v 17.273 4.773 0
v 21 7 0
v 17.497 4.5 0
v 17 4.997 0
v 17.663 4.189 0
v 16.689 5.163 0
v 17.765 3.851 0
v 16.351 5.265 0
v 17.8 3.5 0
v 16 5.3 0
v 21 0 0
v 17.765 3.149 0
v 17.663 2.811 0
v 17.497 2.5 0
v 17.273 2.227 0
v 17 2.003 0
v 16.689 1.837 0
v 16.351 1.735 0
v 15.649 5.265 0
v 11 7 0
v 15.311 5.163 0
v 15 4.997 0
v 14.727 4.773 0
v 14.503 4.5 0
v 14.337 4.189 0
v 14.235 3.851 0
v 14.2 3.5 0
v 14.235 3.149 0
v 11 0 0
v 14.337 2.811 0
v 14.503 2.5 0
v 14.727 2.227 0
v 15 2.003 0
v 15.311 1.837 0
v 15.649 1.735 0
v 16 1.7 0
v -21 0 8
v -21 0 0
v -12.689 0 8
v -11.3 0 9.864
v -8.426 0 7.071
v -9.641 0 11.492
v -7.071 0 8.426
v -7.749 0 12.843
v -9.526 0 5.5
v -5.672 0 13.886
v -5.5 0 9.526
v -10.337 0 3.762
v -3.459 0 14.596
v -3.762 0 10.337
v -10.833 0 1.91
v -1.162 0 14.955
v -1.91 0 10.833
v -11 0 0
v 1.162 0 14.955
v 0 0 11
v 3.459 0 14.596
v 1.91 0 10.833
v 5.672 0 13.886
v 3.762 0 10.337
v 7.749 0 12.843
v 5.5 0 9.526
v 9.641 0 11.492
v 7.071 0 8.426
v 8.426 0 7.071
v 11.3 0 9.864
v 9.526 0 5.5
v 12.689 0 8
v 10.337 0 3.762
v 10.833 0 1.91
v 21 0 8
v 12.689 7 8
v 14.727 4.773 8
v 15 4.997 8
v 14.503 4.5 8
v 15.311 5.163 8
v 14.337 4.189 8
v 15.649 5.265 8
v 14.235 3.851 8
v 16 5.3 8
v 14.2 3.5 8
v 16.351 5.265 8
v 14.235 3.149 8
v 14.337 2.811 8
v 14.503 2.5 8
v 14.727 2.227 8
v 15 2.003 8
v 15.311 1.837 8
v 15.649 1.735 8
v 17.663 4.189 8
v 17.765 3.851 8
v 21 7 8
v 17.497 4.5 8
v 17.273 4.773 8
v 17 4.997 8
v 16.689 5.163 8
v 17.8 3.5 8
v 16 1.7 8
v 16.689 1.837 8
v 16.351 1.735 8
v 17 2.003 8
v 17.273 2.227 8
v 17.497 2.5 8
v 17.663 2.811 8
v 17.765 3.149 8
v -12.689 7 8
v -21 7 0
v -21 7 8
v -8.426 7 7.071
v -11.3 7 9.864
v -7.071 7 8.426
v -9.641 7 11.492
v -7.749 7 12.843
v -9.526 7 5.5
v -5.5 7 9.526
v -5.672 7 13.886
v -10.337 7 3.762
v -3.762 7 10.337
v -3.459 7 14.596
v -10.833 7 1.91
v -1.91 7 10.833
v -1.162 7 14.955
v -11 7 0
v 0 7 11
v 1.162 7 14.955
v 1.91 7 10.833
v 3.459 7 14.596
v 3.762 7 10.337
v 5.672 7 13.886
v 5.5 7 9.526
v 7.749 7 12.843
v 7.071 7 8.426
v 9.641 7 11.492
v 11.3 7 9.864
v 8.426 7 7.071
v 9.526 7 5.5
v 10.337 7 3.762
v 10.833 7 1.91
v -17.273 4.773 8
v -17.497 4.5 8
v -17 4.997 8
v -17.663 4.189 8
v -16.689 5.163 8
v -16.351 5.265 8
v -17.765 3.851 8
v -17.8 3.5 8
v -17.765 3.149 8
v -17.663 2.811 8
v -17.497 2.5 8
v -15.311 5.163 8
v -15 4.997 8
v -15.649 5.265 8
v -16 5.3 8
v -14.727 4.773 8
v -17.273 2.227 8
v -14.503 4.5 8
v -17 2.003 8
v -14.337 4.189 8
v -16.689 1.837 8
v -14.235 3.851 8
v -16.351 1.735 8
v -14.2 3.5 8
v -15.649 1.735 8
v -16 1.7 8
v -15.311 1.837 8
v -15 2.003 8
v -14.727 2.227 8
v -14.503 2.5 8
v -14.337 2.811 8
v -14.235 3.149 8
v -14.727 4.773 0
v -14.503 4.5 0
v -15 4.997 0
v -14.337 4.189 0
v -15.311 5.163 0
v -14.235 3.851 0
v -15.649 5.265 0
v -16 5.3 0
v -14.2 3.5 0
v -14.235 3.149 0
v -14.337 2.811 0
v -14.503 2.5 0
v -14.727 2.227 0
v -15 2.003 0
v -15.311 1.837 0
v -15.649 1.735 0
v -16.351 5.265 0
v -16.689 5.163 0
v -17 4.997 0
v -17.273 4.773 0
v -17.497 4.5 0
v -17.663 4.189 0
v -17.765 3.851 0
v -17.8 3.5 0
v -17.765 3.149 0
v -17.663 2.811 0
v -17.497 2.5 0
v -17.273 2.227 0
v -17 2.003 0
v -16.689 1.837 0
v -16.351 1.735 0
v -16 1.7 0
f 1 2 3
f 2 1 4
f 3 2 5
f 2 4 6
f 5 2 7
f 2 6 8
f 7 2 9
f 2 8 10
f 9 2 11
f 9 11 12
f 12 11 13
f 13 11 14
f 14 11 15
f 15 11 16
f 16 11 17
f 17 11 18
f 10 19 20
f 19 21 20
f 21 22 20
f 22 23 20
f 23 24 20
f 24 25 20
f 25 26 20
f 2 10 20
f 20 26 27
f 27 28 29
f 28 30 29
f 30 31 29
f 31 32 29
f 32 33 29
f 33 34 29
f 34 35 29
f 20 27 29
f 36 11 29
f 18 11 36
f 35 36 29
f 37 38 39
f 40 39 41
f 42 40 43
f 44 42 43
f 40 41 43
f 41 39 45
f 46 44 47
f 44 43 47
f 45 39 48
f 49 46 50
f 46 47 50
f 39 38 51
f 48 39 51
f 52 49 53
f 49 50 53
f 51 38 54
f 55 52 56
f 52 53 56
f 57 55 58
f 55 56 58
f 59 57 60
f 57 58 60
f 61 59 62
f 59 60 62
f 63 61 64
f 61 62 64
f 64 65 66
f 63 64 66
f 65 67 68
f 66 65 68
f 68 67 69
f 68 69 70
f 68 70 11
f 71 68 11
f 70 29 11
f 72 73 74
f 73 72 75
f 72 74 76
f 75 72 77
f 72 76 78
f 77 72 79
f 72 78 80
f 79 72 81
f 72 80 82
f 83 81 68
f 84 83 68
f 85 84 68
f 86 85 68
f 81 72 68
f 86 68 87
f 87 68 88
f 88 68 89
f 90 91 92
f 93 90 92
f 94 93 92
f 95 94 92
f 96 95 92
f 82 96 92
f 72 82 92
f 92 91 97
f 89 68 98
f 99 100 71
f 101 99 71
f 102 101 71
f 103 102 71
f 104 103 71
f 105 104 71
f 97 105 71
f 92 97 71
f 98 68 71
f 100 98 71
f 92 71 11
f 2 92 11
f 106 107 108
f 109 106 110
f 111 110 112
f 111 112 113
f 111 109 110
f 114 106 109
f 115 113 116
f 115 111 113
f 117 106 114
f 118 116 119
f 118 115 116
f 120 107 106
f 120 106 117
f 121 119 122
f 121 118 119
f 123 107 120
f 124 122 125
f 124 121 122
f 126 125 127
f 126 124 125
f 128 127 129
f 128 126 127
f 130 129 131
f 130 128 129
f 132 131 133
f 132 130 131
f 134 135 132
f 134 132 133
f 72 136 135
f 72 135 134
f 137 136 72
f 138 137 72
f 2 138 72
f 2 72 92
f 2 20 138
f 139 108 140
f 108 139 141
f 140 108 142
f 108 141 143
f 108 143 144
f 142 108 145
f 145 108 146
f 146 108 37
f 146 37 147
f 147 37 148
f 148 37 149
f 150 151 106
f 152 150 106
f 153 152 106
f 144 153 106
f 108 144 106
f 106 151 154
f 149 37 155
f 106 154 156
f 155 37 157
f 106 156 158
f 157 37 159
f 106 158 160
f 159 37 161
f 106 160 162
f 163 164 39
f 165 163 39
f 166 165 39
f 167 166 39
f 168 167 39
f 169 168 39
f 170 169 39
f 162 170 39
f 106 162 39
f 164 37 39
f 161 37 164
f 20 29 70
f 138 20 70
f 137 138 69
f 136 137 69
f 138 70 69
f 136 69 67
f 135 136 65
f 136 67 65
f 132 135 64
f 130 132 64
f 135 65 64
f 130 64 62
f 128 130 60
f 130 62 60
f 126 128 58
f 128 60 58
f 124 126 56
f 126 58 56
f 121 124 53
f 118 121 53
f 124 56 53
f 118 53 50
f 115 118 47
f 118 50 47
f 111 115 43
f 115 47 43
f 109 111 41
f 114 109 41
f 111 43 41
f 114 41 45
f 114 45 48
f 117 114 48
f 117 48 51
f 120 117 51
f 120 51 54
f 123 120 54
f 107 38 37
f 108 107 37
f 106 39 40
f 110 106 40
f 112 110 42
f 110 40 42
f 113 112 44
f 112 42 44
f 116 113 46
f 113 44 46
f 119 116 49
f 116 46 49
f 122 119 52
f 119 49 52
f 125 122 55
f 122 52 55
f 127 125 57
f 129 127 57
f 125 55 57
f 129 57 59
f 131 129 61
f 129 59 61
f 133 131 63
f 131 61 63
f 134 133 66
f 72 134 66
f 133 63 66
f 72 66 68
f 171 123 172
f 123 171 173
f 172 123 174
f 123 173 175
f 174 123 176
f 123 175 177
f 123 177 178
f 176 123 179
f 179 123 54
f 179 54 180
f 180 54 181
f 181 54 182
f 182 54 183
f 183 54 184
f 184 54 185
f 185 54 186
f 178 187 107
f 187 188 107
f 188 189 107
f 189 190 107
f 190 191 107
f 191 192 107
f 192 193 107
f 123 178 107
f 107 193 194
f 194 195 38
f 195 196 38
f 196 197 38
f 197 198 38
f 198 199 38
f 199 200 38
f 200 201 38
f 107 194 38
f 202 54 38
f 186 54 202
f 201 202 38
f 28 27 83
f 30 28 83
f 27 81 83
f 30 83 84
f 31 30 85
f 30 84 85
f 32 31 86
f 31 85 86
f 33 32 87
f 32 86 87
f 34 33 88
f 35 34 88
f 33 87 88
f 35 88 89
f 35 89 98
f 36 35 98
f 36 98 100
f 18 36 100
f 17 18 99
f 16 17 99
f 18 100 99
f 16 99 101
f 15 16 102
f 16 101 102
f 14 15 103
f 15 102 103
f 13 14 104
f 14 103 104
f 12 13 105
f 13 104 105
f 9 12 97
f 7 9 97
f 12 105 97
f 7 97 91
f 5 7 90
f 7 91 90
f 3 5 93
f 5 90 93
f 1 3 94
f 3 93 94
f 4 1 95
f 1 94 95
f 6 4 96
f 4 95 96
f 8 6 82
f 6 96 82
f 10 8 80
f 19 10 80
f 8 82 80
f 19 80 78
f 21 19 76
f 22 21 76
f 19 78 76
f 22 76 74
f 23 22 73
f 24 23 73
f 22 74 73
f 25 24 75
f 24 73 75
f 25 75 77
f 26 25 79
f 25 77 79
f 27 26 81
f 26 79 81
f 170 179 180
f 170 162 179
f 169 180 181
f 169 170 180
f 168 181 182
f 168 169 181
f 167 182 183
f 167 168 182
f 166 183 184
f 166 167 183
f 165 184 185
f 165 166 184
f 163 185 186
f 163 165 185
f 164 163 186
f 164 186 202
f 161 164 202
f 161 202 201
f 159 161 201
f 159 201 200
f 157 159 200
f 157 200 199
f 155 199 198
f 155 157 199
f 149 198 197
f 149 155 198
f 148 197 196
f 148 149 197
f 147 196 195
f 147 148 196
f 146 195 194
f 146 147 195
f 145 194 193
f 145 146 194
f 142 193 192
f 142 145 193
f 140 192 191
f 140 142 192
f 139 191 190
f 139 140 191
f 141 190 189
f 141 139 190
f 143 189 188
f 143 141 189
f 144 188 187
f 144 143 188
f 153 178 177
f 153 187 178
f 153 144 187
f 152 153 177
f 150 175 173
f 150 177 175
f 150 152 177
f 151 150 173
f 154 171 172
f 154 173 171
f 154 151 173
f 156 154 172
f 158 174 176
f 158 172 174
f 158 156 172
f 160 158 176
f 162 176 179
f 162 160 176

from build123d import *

# Parameters (mm, degrees)
BOSS_EXTRUDE1_DEPTH = 7
SKETCH4_R           = 1.8
CUT_EXTRUDE3_DEPTH  = 27.739483914


with BuildPart() as part:
    # Sketch3 → Boss-Extrude1 (new body)
    with BuildSketch(Plane(origin=(0, 0, 0), x_dir=(1, 0, 0), z_dir=(0, 1, 0))):
        with BuildLine():
            Line((-11, 0), (-21, 0))
            Line((-21, 0), (-21, -8))
            Line((-21, -8), (-12.68857754, -8))
            ThreePointArc((-12.68857754, -8), (0, -15), (12.68857754, -8))
            Line((12.68857754, -8), (21, -8))
            Line((21, -8), (21, 0))
            Line((21, 0), (11, 0))
            ThreePointArc((11, 0), (0, -11), (-11, 0))
        make_face()
    extrude(amount=BOSS_EXTRUDE1_DEPTH)

    # Sketch4 → Cut-Extrude3 (cut, symmetric)
    with BuildSketch(Plane.XY):
        with Locations(Location((16, 3.5, 0), (0, 0, 180))):
            Circle(SKETCH4_R)
    cut_extrude3 = extrude(amount=CUT_EXTRUDE3_DEPTH, both=True, mode=Mode.SUBTRACT)

    # Mirror1: Cut-Extrude3 across plane
    add(cut_extrude3.mirror(Plane(origin=(0, 0, 0), x_dir=(0, 0, 1), z_dir=(1, 0, 0))), mode=Mode.SUBTRACT)


solid = part.part
